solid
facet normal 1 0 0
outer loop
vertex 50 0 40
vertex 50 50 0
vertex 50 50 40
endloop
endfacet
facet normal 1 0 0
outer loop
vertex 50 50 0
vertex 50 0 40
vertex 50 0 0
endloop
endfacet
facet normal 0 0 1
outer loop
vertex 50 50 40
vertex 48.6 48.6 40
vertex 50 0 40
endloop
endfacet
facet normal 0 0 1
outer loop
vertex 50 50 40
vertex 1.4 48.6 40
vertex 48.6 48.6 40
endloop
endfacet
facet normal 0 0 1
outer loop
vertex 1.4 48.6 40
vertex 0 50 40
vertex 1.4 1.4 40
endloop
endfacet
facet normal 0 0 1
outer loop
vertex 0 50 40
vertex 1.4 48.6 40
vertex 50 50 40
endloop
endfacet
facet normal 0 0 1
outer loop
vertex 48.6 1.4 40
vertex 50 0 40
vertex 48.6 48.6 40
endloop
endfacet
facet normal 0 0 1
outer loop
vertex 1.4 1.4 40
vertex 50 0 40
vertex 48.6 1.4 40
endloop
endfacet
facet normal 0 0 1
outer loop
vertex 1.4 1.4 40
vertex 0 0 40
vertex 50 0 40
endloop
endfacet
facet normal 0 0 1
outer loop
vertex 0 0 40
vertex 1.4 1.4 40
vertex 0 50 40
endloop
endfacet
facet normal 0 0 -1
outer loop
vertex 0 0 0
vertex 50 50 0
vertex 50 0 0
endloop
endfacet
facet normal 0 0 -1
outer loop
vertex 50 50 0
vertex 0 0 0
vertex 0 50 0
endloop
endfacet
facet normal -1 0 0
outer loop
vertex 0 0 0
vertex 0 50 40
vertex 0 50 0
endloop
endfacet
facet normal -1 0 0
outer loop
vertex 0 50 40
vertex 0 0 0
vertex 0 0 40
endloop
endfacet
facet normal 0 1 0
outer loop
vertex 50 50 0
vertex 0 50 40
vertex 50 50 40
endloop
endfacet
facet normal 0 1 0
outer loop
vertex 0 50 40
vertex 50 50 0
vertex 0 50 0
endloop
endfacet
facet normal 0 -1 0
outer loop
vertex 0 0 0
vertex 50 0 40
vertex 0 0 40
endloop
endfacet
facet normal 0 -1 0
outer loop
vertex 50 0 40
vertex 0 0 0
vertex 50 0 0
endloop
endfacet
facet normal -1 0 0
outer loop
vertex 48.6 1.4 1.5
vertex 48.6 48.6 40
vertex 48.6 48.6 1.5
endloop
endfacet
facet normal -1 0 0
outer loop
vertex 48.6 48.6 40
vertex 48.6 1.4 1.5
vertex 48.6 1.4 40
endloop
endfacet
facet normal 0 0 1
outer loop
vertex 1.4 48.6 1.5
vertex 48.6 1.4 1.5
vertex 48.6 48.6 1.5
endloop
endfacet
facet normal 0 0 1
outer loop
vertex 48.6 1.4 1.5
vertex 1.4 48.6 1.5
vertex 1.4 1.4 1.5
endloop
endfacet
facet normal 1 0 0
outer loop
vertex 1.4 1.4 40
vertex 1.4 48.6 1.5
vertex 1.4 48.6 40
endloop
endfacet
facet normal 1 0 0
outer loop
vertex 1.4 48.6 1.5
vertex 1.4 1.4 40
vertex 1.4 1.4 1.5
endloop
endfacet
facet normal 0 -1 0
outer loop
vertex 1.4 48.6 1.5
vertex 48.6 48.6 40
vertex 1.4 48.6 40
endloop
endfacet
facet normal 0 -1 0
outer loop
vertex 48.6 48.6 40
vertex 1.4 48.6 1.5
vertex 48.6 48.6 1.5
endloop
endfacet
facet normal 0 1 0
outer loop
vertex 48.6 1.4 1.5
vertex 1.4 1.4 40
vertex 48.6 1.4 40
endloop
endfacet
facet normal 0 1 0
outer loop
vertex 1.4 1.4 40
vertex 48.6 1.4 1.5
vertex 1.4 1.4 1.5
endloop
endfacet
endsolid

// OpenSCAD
$fn = 32;

// ----------------------------------------------------------------------
// Open box: 1.4 mm walls
// ----------------------------------------------------------------------

// --- parameters (mm) ---
box_l = 50;               // outer length, X
box_w = 50;               // outer width, Y
box_h = 40;               // outer height, Z
wall = 1.4;               // wall thickness
floor = 1.5;              // floor thickness

difference() {
  cube([box_l, box_w, box_h]);
  translate([wall, wall, floor])
    cube([box_l - 2 * wall, box_w - 2 * wall, box_h]);
}
